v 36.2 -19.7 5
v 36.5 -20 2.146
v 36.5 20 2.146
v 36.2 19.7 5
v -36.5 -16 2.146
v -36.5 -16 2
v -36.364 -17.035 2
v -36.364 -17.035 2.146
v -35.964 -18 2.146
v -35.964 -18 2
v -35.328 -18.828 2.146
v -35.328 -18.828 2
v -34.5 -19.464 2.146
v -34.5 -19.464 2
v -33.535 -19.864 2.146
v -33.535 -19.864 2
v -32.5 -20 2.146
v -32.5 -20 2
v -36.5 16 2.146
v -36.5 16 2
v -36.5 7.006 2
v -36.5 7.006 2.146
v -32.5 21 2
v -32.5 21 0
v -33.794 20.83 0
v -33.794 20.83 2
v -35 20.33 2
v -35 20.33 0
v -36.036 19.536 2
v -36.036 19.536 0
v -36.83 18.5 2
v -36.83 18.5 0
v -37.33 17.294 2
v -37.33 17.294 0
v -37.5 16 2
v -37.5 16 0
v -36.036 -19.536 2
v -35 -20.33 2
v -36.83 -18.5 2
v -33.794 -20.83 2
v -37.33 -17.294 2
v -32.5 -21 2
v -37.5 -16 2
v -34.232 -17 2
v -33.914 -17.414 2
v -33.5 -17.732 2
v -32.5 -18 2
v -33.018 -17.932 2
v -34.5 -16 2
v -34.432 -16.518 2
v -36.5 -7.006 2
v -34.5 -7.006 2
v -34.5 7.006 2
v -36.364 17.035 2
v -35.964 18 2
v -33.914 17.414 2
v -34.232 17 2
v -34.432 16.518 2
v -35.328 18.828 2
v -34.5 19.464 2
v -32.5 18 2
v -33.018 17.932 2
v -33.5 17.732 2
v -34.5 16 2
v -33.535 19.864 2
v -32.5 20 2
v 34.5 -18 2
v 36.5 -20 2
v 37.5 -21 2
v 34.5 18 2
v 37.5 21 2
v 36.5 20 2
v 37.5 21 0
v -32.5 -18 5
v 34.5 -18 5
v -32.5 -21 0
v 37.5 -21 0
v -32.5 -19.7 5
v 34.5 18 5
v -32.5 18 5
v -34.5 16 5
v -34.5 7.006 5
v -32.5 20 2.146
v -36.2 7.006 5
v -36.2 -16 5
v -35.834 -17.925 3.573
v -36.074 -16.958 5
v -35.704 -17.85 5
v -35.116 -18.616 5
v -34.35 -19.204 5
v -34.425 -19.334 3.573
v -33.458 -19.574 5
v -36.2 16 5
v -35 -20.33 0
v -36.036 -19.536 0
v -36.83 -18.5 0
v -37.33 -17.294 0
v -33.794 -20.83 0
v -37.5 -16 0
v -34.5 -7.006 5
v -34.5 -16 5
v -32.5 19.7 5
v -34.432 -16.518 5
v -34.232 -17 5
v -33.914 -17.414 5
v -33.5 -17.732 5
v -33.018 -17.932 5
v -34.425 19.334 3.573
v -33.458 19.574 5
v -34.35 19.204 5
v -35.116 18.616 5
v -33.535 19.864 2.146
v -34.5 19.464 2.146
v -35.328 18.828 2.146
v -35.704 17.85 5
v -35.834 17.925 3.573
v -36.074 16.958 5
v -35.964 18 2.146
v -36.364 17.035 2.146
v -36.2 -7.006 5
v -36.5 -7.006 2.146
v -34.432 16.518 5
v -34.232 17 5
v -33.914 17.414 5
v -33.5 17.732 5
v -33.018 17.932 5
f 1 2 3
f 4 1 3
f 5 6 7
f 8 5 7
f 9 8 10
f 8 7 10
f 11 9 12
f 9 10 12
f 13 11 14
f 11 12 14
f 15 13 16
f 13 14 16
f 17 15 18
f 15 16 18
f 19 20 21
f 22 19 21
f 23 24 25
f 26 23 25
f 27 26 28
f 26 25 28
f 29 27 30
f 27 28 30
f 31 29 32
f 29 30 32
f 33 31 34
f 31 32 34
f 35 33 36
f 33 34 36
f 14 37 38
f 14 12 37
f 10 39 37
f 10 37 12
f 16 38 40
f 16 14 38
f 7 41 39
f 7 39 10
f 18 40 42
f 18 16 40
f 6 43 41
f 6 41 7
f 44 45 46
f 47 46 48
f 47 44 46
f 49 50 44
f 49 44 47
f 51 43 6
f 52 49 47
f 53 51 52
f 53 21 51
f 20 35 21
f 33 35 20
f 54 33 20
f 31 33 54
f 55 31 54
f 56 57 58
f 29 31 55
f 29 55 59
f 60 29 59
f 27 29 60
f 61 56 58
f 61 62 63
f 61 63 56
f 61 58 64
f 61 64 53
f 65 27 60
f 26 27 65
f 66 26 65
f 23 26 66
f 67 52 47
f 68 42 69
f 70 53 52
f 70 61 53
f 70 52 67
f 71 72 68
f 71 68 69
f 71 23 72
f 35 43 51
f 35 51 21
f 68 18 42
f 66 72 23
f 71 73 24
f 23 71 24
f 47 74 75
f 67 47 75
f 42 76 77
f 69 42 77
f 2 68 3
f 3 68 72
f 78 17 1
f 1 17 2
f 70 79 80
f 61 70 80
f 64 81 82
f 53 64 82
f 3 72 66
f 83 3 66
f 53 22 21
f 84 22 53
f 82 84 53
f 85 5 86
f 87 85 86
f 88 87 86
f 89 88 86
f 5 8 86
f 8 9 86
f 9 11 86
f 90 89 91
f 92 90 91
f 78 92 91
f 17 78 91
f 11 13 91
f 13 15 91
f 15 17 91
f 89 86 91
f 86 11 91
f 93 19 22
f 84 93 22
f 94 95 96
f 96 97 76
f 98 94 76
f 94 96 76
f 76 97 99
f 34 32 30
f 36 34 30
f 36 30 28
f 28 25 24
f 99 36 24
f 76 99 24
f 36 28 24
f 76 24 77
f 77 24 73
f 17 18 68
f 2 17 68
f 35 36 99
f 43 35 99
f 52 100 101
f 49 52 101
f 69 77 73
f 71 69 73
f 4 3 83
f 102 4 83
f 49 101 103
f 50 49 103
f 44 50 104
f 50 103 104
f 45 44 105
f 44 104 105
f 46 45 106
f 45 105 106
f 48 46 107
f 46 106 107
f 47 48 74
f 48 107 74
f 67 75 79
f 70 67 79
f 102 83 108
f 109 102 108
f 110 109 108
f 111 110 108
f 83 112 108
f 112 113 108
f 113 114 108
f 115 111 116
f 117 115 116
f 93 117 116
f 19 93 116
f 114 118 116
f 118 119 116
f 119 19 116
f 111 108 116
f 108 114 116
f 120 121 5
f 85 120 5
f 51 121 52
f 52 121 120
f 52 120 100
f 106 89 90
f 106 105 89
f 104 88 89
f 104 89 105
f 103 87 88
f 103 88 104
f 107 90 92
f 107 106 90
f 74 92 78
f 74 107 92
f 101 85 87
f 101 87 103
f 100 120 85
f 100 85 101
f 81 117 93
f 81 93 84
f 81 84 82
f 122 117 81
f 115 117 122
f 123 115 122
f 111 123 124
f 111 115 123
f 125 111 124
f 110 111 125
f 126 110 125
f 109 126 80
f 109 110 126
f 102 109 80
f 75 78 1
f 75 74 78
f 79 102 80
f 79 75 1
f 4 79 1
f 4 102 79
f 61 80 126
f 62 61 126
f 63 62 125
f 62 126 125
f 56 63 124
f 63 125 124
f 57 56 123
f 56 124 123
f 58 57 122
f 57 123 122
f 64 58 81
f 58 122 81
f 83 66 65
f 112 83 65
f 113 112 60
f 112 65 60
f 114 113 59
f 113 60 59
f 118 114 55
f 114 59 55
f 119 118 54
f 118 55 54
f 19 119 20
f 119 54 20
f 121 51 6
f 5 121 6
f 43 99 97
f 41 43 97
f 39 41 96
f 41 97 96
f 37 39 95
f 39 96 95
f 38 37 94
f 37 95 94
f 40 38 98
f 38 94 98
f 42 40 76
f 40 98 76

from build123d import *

# Parameters (mm, degrees)
F1_DEPTH = 2
F3_DEPTH = 5
F5_DEPTH = 3
F6_W     = 3.5266056657
F6_H     = 14.0113048255
F7_DEPTH = 3
F8_SIZE2 = 2.8543093363
F8_SIZE  = 0.3


with BuildPart() as f1:
    # F0 (on Top) → F1 (new body)
    with BuildSketch(Plane.XY):
        with BuildLine():
            Line((37.5, -21), (37.5, 21))
            Line((37.5, 21), (-32.5, 21))
            ThreePointArc((-32.5, 21), (-36.0355339059, 19.5355339059), (-37.5, 16))
            Line((-37.5, 16), (-37.5, -16))
            ThreePointArc((-37.5, -16), (-36.0355339059, -19.5355339059), (-32.5, -21))
            Line((-32.5, -21), (37.5, -21))
        make_face()
    extrude(amount=F1_DEPTH)

    # F2 (on Top) → F3 (join)
    with BuildSketch(Plane.XY):
        with BuildLine():
            ThreePointArc((-36.5, -16), (-35.3284271247, -18.8284271247), (-32.5, -20))
            Line((-32.5, -20), (36.5, -20))
            Line((36.5, -20), (36.5, 20))
            Line((36.5, 20), (-32.5, 20))
            ThreePointArc((-32.5, 20), (-35.3284271247, 18.8284271247), (-36.5, 16))
            Line((-36.5, 16), (-36.5, -16))
        make_face()
    extrude(amount=F3_DEPTH)

    # F4 (on face) → F5 (cut)
    with BuildSketch(Plane.XY.offset(5)):
        with BuildLine():
            ThreePointArc((-32.5, 18), (-33.9142135624, 17.4142135624), (-34.5, 16))
            Line((-34.5, 16), (-34.5, -16))
            ThreePointArc((-34.5, -16), (-33.9142135624, -17.4142135624), (-32.5, -18))
            Line((-32.5, -18), (34.5, -18))
            Line((34.5, -18), (34.5, 18))
            Line((34.5, 18), (-32.5, 18))
        make_face()
    extrude(amount=-F5_DEPTH, mode=Mode.SUBTRACT)

    # F6 (on face) → F7 (cut)
    with BuildSketch(Plane.XY.offset(5)):
        with Locations((-35.1931601763, 0)):
            Rectangle(F6_W, F6_H)
    extrude(amount=-F7_DEPTH, mode=Mode.SUBTRACT)

    # F8
    f8_edges = [f1.edges().sort_by_distance(p)[0] for p in [
        (-36.5, -11.502826, 5),
        (36.5, 0, 5),
        (2, 20, 5),
    ]]
    f8_side = f1.faces().sort_by_distance((2, 19.167594, 5))[0]
    chamfer(f8_edges, length=F8_SIZE, length2=F8_SIZE2, reference=f8_side)


solid = f1.part
